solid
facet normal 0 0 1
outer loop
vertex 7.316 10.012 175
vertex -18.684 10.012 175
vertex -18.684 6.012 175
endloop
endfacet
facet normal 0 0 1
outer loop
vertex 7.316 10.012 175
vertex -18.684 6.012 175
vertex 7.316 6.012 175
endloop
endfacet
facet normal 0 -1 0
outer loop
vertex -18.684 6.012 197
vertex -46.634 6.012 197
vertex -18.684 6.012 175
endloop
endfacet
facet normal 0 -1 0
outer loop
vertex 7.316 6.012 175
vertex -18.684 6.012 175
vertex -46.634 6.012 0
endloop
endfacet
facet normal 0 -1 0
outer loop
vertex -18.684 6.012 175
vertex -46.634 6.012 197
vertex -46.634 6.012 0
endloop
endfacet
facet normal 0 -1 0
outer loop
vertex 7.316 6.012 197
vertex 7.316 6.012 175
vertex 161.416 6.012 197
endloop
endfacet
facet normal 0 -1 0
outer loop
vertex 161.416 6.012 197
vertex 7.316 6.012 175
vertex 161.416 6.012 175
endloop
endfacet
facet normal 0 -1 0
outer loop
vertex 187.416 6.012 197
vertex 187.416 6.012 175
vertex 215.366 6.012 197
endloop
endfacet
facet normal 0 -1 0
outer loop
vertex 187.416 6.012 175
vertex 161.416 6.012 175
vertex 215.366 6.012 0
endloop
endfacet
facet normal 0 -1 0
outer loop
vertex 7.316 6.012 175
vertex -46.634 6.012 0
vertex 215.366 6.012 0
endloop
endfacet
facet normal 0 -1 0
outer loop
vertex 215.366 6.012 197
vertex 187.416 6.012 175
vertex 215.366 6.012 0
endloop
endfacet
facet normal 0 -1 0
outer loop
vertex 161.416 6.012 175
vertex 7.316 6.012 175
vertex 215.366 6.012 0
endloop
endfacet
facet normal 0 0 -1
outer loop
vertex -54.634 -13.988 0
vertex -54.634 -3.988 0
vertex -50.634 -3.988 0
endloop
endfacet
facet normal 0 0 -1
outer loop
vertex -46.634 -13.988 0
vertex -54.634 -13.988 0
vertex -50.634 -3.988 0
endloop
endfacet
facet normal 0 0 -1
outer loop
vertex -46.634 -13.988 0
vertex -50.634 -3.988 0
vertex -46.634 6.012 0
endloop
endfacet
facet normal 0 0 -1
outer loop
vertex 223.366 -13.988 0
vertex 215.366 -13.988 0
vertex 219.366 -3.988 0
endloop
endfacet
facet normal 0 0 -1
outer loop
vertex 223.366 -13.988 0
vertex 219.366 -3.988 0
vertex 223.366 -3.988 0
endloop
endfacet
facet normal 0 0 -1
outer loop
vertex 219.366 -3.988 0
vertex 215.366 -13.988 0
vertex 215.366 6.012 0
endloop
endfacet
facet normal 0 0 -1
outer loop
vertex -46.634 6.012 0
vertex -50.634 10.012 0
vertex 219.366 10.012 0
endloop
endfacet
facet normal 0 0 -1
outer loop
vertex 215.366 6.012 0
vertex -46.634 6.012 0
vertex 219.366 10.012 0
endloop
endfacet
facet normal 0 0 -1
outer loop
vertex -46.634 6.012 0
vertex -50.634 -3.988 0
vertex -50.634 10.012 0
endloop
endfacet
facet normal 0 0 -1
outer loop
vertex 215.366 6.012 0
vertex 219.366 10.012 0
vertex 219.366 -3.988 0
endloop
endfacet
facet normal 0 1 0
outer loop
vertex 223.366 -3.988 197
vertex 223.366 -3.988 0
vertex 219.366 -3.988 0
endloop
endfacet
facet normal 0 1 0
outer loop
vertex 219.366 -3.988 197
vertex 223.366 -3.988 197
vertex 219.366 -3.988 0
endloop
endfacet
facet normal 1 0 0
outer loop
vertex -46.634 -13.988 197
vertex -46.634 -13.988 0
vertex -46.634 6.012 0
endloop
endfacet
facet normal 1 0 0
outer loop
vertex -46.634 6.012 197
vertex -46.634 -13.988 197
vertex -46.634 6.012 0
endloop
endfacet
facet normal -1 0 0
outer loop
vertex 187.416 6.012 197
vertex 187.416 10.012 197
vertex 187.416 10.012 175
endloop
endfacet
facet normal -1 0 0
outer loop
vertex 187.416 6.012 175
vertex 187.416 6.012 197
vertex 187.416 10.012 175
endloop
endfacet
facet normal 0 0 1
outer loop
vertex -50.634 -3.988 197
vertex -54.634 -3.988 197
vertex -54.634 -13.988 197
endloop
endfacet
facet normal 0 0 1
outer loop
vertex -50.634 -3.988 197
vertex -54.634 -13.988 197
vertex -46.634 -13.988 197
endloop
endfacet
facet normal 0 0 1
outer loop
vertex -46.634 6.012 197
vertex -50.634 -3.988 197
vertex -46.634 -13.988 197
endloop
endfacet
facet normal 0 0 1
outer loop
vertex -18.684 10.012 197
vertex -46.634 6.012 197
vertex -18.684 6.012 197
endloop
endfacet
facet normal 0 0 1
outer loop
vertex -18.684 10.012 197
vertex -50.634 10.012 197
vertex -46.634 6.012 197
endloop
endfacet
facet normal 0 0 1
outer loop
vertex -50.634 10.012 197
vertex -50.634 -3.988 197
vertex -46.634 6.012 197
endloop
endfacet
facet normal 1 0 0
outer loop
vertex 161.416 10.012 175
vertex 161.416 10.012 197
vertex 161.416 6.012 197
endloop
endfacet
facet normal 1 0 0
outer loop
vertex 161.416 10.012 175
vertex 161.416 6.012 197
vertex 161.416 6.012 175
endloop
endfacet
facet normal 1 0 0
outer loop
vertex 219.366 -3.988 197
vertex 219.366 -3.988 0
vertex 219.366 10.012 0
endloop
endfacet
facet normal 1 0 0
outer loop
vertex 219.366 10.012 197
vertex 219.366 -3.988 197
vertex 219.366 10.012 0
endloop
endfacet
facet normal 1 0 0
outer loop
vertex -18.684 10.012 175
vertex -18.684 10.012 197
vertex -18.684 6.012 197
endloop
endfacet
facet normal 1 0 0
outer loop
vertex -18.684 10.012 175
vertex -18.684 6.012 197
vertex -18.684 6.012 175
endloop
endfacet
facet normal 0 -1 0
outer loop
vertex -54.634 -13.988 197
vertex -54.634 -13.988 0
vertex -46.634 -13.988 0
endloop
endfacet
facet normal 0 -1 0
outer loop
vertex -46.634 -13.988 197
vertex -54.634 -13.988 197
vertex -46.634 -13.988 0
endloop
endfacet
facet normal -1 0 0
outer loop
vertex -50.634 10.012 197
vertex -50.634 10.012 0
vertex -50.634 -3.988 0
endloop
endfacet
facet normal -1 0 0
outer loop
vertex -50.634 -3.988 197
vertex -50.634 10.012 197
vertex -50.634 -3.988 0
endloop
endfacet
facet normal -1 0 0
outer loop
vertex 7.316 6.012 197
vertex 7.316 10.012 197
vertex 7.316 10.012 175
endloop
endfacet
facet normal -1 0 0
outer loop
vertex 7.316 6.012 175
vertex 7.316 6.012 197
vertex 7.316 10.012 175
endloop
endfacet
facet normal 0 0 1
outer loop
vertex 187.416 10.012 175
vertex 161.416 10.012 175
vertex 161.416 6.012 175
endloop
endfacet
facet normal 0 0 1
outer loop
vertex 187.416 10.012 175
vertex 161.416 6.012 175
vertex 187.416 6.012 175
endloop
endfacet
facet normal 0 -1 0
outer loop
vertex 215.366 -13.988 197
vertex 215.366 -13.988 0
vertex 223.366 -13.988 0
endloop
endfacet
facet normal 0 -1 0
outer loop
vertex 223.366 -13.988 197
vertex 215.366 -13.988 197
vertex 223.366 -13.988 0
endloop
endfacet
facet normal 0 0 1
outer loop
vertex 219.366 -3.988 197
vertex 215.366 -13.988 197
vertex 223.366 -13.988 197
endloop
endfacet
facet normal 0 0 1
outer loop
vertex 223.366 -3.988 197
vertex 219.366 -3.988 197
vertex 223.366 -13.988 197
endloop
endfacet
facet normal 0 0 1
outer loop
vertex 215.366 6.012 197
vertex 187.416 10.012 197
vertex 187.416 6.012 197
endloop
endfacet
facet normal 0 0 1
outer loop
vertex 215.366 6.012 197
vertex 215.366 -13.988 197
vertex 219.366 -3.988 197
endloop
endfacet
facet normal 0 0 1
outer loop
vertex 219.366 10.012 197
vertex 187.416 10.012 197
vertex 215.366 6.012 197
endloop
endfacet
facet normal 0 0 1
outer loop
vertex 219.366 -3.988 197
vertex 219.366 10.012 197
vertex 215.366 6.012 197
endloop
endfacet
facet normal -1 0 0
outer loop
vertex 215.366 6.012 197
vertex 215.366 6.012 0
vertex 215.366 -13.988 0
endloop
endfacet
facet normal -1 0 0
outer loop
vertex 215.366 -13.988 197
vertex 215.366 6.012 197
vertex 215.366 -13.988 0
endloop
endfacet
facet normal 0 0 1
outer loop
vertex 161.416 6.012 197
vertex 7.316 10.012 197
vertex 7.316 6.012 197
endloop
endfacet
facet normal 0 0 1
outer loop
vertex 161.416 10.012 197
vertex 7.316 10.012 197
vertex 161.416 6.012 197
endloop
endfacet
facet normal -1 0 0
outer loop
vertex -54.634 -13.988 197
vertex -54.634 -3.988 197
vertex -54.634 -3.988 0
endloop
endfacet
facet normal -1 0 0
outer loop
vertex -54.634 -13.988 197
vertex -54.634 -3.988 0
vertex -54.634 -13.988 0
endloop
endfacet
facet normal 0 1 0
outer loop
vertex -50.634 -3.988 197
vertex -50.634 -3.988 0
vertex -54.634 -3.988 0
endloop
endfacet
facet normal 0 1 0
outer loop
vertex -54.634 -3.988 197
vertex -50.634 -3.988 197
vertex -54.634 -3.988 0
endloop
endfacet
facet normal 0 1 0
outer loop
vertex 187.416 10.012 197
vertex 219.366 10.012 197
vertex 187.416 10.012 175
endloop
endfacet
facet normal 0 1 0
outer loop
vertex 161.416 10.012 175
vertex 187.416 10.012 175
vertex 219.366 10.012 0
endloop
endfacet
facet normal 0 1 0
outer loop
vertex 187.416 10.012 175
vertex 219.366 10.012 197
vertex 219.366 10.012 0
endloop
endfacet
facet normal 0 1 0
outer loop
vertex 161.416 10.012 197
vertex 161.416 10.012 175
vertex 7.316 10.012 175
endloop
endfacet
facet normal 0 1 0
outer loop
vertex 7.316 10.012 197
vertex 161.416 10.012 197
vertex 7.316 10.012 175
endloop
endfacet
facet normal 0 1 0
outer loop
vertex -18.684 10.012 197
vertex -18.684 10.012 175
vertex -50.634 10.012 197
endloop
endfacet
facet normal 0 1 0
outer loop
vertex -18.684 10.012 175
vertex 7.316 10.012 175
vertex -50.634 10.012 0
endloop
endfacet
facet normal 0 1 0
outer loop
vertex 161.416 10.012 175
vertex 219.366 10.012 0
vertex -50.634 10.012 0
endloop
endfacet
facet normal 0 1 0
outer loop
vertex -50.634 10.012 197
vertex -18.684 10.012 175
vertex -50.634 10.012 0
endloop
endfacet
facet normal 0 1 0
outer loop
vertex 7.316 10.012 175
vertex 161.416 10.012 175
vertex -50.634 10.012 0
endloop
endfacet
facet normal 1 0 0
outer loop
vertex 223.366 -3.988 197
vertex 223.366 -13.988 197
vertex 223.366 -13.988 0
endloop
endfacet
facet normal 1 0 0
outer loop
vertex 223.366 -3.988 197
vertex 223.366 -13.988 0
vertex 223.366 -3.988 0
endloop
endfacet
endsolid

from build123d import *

# Parameters (mm, degrees)
SALIENTE_EXTRUIR1_DEPTH = 197
CROQUIS3_W              = 26
CROQUIS3_H              = 22
CORTAR_EXTRUIR1_DEPTH   = 299.793079874


with BuildPart() as part:
    # Croquis1 → Saliente-Extruir1 (new body)
    with BuildSketch(Plane.XY):
        Polygon((219.365853659, 10.012195122), (-50.634146341, 10.012195122), (-50.634146341, -3.987804878), (-54.634146341, -3.987804878), (-54.634146341, -13.987804878), (-49.344908275, -13.987804878), (-46.634146341, -13.987804878), (-46.634146341, -3.987804878), (-46.634146341, 6.012195122), (215.365853659, 6.012195122), (215.365853659, -3.987804878), (215.365853659, -13.987804878), (219.1357706, -13.987804878), (223.365853659, -13.987804878), (223.365853659, -3.987804878), (219.365853659, -3.987804878), align=None)
    extrude(amount=SALIENTE_EXTRUIR1_DEPTH)

    # Croquis3 → Cortar-Extruir1 (cut, through all)
    with BuildSketch(Plane(origin=(0, 10.012195122, 0), x_dir=(1, 0, 0), z_dir=(0, 1, 0))):
        with Locations((-5.684146341, -186)):
            Rectangle(CROQUIS3_W, CROQUIS3_H)
        with Locations((174.415853659, -186)):
            Rectangle(CROQUIS3_W, CROQUIS3_H)
    extrude(amount=-CORTAR_EXTRUIR1_DEPTH, mode=Mode.SUBTRACT)


solid = part.part
